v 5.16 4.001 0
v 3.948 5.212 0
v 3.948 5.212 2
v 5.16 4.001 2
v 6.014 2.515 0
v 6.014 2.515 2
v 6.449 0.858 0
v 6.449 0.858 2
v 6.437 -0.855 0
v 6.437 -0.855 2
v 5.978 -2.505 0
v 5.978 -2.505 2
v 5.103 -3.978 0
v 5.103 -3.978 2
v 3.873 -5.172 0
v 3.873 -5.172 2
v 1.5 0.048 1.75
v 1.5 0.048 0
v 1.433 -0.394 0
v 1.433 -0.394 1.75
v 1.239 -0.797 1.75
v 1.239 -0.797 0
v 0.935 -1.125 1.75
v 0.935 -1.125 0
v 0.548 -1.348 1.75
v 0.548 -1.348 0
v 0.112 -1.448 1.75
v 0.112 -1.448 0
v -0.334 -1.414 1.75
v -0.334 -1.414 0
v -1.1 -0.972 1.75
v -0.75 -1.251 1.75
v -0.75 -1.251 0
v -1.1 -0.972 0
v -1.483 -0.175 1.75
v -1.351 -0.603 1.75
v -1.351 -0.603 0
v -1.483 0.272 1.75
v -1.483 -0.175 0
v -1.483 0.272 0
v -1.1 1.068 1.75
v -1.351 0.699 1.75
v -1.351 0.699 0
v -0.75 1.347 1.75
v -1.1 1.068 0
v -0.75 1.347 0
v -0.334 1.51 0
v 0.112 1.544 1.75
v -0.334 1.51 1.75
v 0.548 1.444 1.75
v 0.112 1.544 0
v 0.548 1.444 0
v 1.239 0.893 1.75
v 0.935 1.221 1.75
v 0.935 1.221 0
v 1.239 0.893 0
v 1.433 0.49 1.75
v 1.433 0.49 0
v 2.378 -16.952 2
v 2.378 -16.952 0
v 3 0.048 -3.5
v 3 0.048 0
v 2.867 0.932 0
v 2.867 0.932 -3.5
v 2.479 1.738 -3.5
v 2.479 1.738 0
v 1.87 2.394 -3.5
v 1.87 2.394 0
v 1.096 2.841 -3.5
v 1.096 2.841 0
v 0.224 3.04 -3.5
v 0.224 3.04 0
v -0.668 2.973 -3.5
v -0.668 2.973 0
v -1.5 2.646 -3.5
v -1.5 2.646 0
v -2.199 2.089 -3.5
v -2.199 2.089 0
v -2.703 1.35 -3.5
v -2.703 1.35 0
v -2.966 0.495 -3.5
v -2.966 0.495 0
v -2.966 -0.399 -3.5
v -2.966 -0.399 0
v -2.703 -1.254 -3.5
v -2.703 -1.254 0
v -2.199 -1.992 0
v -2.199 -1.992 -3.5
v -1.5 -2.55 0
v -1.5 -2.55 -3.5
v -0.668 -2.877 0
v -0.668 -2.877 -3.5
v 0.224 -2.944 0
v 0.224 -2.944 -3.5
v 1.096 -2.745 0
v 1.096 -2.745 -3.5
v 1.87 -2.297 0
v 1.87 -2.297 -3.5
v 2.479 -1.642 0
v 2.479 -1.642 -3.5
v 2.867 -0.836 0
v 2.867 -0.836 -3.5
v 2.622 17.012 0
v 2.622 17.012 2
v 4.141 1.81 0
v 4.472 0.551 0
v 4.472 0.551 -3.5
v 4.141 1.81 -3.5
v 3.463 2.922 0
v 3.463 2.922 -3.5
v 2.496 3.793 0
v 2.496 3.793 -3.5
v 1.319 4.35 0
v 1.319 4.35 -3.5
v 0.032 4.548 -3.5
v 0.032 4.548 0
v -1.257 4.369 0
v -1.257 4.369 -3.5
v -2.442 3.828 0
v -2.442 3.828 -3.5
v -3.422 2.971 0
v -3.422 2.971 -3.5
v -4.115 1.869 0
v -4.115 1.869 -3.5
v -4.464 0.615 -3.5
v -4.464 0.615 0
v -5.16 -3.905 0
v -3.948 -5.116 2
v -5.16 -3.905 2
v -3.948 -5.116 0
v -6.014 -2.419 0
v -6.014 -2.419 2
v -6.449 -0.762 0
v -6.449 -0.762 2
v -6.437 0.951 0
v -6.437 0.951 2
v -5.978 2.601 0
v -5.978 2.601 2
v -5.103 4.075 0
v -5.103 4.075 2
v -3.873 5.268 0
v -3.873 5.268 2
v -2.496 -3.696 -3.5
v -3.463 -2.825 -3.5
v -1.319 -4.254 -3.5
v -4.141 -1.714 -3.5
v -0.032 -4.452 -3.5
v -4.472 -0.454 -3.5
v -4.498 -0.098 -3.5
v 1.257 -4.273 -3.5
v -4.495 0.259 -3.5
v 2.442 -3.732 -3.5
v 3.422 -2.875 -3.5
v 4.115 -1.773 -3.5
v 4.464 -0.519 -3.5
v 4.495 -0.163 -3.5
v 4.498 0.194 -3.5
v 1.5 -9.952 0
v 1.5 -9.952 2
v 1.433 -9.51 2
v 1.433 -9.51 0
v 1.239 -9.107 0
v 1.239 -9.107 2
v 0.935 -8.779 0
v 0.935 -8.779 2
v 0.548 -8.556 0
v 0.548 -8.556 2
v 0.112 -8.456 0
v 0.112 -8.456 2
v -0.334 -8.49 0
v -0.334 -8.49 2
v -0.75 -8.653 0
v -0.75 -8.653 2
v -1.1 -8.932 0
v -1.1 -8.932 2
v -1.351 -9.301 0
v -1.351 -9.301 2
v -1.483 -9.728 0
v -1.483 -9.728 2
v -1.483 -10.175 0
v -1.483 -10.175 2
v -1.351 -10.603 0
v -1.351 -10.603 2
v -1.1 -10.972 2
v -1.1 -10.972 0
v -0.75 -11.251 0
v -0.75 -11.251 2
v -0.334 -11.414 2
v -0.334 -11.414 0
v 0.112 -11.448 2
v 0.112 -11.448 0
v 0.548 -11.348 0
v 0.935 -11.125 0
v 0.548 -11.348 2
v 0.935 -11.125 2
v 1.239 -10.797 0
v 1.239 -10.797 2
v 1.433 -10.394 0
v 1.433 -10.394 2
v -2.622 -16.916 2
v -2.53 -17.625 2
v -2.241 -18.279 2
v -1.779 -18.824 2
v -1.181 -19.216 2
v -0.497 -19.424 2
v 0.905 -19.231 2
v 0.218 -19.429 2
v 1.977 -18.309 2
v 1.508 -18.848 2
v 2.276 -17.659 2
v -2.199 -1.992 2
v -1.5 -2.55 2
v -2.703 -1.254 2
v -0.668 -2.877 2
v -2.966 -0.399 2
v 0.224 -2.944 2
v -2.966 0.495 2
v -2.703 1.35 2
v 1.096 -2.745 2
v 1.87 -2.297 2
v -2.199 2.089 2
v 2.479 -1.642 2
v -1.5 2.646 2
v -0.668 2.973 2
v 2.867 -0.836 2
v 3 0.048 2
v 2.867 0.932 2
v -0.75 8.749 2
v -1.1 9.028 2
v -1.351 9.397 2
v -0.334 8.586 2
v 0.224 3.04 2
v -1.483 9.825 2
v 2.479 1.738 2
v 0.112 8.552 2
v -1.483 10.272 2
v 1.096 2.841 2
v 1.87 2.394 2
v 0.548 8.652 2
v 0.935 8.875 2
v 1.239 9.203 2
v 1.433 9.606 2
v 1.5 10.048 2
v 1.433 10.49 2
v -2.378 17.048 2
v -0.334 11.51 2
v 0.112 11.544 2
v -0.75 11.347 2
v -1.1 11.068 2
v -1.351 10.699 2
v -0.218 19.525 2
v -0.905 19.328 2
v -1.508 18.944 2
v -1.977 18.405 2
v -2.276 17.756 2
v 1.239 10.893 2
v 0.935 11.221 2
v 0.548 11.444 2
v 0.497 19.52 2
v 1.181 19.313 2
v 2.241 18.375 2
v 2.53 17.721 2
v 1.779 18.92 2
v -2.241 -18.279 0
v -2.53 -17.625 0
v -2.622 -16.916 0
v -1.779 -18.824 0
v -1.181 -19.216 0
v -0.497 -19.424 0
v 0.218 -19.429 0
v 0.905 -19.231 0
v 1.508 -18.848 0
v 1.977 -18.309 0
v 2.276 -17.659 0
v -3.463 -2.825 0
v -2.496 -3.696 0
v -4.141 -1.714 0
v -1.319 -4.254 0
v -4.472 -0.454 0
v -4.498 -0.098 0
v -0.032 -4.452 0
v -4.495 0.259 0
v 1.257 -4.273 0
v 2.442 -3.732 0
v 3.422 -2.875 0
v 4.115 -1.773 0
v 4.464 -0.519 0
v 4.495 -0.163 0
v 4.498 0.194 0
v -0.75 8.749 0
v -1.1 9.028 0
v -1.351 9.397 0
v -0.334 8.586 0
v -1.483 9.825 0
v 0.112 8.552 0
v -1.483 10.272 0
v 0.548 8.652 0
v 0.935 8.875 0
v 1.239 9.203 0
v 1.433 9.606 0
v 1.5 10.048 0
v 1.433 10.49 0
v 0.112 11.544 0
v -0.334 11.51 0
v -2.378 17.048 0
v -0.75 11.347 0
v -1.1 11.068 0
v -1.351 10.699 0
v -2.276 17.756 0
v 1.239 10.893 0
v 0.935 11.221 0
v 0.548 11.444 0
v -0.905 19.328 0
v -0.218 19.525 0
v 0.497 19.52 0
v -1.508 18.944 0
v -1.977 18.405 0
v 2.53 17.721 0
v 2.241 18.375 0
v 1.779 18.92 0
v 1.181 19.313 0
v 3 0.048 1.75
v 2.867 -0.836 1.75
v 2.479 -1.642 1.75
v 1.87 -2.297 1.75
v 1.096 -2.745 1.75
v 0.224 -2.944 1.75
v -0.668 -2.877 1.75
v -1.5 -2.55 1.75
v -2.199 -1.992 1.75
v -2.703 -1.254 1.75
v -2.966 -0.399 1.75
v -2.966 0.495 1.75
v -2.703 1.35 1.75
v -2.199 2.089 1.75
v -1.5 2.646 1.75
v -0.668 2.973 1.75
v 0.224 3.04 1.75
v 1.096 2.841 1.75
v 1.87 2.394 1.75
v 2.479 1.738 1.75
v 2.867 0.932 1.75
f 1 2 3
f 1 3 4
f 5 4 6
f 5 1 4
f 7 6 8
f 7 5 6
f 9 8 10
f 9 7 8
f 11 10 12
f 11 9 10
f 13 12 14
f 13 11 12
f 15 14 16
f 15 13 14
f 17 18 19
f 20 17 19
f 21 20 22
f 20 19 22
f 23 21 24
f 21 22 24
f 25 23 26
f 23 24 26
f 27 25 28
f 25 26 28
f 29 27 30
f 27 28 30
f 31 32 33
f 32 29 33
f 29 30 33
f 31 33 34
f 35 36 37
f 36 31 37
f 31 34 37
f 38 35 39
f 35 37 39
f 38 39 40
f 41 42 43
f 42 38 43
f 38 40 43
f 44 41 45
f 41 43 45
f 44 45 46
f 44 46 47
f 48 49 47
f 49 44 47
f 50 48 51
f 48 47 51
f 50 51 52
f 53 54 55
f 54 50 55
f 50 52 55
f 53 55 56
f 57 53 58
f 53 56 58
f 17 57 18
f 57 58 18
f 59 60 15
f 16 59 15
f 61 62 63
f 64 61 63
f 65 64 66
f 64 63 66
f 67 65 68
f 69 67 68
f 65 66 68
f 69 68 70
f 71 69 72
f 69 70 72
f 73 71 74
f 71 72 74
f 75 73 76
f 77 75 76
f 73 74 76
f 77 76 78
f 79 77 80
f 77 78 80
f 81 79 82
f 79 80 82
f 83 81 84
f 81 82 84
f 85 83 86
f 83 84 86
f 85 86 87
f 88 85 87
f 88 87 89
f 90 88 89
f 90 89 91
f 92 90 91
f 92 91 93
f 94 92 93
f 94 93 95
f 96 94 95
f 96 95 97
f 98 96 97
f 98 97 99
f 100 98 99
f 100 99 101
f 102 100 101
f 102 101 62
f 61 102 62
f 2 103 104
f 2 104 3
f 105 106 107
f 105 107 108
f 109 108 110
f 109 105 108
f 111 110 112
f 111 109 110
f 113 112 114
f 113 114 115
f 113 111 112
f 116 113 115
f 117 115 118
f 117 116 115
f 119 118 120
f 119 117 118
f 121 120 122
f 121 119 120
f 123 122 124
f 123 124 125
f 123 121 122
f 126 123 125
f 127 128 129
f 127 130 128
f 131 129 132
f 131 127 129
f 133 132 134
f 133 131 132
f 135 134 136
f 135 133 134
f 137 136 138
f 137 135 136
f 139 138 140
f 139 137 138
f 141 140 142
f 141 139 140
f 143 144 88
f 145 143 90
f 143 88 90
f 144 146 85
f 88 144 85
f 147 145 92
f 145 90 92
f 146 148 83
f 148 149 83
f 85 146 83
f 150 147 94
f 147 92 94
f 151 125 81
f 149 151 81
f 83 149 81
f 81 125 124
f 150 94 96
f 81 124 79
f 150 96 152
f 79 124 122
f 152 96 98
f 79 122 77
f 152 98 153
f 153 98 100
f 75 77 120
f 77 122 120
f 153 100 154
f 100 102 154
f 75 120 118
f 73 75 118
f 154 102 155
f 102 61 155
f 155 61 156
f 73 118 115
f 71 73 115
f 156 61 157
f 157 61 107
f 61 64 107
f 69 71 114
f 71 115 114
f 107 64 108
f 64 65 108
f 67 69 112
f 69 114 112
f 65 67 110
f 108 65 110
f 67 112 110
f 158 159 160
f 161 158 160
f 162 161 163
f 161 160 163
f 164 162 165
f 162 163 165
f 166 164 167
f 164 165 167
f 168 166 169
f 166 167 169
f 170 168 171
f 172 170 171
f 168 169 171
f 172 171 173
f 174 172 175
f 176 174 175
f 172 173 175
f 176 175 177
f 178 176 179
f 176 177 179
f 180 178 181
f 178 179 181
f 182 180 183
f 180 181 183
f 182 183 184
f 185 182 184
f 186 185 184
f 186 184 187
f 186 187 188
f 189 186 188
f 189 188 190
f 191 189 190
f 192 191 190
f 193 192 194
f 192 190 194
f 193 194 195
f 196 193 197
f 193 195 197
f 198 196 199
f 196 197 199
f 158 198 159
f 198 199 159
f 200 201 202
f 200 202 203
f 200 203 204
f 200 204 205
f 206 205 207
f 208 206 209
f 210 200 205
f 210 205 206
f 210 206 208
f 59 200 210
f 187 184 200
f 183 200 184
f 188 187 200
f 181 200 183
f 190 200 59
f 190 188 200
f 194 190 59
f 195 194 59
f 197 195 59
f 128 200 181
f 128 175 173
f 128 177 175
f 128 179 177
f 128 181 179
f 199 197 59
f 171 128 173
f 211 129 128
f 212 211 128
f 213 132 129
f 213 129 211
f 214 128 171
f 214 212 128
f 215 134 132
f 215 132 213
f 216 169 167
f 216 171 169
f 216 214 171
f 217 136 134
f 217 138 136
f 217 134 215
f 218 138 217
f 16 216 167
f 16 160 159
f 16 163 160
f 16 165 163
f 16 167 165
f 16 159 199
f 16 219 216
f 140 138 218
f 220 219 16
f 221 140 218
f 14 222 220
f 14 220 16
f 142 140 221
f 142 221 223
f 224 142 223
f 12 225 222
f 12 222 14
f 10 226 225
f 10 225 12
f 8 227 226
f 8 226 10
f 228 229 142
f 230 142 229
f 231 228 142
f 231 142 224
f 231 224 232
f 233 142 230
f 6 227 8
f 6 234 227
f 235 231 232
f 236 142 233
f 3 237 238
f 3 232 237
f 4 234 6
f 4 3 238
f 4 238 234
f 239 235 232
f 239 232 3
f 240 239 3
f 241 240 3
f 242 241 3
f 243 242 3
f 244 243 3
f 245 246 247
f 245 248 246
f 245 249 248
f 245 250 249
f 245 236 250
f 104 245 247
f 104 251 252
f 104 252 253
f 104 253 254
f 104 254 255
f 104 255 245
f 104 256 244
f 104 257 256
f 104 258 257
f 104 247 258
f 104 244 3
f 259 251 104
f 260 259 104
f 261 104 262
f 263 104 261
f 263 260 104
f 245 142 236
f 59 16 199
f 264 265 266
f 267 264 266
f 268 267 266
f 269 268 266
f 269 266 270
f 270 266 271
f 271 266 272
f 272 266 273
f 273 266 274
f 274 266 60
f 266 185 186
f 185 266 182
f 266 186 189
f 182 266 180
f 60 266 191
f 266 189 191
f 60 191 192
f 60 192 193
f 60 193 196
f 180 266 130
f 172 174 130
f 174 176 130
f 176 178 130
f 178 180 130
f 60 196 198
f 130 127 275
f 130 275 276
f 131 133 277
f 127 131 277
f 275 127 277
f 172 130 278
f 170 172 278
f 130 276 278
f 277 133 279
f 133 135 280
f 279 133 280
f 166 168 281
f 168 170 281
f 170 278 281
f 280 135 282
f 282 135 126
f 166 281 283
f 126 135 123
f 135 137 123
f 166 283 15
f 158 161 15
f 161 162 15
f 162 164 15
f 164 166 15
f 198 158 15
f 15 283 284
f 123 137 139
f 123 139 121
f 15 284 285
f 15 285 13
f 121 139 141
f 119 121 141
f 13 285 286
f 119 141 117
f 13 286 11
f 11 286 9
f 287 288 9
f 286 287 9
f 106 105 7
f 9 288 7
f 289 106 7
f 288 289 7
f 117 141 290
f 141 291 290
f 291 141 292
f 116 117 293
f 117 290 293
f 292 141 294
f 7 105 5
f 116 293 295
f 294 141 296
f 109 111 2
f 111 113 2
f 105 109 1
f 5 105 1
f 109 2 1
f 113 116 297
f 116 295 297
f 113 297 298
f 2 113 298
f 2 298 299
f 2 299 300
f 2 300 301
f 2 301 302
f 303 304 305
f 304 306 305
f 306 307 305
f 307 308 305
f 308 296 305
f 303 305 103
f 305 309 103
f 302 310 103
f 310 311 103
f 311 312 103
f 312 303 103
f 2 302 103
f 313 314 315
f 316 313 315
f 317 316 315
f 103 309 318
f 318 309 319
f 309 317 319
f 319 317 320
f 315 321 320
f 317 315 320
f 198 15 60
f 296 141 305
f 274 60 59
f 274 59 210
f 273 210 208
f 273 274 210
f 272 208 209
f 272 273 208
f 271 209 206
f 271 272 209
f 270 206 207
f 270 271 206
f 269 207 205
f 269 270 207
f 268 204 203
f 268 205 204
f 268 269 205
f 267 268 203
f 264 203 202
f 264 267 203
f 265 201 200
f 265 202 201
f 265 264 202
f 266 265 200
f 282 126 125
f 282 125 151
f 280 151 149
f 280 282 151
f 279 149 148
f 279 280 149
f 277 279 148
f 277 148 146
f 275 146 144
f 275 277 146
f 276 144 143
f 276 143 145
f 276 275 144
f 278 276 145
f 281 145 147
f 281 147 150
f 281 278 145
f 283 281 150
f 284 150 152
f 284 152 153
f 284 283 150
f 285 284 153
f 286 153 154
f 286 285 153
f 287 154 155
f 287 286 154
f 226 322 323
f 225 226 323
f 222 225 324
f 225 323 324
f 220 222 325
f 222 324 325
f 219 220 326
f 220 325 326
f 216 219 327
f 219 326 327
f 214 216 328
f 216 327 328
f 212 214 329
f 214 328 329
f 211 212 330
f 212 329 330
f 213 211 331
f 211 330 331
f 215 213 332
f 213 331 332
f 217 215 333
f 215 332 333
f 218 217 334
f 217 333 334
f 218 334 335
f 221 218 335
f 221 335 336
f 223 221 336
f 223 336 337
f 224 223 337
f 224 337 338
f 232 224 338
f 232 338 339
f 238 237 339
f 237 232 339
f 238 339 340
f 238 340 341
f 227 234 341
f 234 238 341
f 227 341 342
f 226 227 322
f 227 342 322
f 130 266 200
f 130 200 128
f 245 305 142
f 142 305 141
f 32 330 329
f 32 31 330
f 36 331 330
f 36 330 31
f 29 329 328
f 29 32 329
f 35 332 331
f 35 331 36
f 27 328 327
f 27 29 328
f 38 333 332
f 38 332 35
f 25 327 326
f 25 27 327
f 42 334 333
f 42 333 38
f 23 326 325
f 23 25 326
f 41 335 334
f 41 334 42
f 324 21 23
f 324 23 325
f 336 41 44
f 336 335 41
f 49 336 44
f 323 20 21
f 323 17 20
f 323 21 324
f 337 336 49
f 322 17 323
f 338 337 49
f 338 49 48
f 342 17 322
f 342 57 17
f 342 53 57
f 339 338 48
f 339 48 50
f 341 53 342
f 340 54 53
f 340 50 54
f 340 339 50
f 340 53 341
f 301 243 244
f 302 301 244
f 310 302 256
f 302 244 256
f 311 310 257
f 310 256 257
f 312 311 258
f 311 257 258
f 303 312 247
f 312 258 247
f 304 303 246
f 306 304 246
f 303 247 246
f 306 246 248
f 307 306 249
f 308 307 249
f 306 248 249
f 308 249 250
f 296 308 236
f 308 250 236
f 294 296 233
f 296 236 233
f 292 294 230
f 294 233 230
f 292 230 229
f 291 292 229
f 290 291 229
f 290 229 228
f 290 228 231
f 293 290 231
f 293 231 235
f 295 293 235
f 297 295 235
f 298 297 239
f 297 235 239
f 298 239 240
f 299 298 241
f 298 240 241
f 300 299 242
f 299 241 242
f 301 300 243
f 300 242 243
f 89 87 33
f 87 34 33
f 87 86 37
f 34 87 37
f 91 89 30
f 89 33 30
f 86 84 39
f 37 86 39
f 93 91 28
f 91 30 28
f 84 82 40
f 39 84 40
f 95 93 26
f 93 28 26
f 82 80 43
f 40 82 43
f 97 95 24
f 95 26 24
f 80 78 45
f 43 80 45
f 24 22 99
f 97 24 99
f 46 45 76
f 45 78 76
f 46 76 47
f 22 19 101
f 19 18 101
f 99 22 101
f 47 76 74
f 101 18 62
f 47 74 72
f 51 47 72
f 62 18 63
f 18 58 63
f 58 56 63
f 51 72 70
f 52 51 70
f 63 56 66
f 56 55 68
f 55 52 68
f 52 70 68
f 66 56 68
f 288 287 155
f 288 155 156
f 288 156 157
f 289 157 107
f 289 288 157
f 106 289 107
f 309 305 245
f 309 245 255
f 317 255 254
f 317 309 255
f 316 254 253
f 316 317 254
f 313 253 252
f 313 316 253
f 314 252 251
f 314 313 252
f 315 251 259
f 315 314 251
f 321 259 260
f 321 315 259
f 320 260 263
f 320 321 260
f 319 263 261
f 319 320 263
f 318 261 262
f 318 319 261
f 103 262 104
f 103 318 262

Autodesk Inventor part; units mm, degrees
ref_plane "YZ Plane" through (0, 0, 0) normal (1, 0, 0) x (0, 1, 0)
ref_plane "XZ Plane" through (0, 0, 0) normal (0, 1, 0) x (-1, 0, 0)
ref_plane "XY Plane" through (0, 0, 0) normal (0, 0, 1) x (1, 0, 0)
sketch "Sketch1" plane through (0, 0, 0) normal (0, 0, 1) x (1, 0, 0)
  circle A0 centre (0, 0.0481) radius 3
  circle A1 centre (0, 0.0481) radius 1.5
  circle A2 centre (0, 0.0481) radius 6.5
  arc A3 (2.6218, 17.0122) -> (-2.3779, 17.0481) centre (0.1221, 17.0481) ccw
  line L0 (0.1221, 17.0481) -> (-2.3779, 17.0481) construction
  line L1 (0.1221, 17.0481) -> (2.6221, 17.0481) construction
  line L2 (2.6221, 17.0481) -> (0.1221, 17.0481) construction
  line L3 (-2.3779, 17.0481) -> (-4.4642, 0.6149)
  line L4 (0.1221, 17.0481) -> (0, 0.0481) construction
  line L5 (2.6218, 17.0122) -> (4.4718, 0.5507)
  line L6 (0, 0.0481) -> (-9.4947, 0.1163) construction
  arc A4 (-2.6218, -16.916) -> (2.3779, -16.9519) centre (-0.1221, -16.9519) ccw
  line L7 (-2.6218, -16.916) -> (-4.4718, -0.4544)
  line L8 (2.3779, -16.9519) -> (4.4642, -0.5186)
  arc A5 (-4.4642, 0.6149) -> (-4.4718, -0.4544) centre (0, 0.0481) ccw
  arc A6 (4.4642, -0.5186) -> (4.4718, 0.5507) centre (0, 0.0481) ccw
  circle A7 centre (0, 0.0481) radius 4.5
  dimension "d1" = 3
  dimension "d2" = 6
  dimension "d4" = 13
  dimension "d5" = 5
  dimension "d6" = 17
  dimension "d8" = 16.5652
  dimension "d9" = 16.5652
  dimension "d10" = 97.235
  dimension "d20" = 13.9277
extrude "Extrusion1" add sketch "Sketch1" along normal blind 2 contours L5 A7 L3 A2 | A2 L3 A3 L5 | L8 A4 L7 A2 | A2 L7 A7 L8 | A6 A7 A5
extrude "Extrusion2" add sketch "Sketch1" along normal blind 2 contours A2 L8 A6 L5 | L5 A7 L3 A2 | A2 L7 A7 L8 | L3 A5 L7 A2 | A6 A7 A5
extrude "Extrusion3" add sketch "Sketch1" against normal blind 3.5 contours A6 A7 A5
extrude "Extrusion4" add sketch "Sketch1" along normal blind 1.75 contours A0
sketch "Sketch2" plane through (0, 0, 2) normal (0, 0, 1) x (1, 0, 0)
  circle A0 centre (0, 0.0481) radius 3 projected
  circle A1 centre (0, 10.0481) radius 1.5
  circle A2 centre (0, -9.9519) radius 1.5
  dimension "d25" = 3
  dimension "d26" = 3
  dimension "d29" = 10
  dimension "d30" = 10
extrude "Extrusion5" cut sketch "Sketch2" against normal blind 2 contours A1 | A2
properties part number "acople estrella2 servo"
